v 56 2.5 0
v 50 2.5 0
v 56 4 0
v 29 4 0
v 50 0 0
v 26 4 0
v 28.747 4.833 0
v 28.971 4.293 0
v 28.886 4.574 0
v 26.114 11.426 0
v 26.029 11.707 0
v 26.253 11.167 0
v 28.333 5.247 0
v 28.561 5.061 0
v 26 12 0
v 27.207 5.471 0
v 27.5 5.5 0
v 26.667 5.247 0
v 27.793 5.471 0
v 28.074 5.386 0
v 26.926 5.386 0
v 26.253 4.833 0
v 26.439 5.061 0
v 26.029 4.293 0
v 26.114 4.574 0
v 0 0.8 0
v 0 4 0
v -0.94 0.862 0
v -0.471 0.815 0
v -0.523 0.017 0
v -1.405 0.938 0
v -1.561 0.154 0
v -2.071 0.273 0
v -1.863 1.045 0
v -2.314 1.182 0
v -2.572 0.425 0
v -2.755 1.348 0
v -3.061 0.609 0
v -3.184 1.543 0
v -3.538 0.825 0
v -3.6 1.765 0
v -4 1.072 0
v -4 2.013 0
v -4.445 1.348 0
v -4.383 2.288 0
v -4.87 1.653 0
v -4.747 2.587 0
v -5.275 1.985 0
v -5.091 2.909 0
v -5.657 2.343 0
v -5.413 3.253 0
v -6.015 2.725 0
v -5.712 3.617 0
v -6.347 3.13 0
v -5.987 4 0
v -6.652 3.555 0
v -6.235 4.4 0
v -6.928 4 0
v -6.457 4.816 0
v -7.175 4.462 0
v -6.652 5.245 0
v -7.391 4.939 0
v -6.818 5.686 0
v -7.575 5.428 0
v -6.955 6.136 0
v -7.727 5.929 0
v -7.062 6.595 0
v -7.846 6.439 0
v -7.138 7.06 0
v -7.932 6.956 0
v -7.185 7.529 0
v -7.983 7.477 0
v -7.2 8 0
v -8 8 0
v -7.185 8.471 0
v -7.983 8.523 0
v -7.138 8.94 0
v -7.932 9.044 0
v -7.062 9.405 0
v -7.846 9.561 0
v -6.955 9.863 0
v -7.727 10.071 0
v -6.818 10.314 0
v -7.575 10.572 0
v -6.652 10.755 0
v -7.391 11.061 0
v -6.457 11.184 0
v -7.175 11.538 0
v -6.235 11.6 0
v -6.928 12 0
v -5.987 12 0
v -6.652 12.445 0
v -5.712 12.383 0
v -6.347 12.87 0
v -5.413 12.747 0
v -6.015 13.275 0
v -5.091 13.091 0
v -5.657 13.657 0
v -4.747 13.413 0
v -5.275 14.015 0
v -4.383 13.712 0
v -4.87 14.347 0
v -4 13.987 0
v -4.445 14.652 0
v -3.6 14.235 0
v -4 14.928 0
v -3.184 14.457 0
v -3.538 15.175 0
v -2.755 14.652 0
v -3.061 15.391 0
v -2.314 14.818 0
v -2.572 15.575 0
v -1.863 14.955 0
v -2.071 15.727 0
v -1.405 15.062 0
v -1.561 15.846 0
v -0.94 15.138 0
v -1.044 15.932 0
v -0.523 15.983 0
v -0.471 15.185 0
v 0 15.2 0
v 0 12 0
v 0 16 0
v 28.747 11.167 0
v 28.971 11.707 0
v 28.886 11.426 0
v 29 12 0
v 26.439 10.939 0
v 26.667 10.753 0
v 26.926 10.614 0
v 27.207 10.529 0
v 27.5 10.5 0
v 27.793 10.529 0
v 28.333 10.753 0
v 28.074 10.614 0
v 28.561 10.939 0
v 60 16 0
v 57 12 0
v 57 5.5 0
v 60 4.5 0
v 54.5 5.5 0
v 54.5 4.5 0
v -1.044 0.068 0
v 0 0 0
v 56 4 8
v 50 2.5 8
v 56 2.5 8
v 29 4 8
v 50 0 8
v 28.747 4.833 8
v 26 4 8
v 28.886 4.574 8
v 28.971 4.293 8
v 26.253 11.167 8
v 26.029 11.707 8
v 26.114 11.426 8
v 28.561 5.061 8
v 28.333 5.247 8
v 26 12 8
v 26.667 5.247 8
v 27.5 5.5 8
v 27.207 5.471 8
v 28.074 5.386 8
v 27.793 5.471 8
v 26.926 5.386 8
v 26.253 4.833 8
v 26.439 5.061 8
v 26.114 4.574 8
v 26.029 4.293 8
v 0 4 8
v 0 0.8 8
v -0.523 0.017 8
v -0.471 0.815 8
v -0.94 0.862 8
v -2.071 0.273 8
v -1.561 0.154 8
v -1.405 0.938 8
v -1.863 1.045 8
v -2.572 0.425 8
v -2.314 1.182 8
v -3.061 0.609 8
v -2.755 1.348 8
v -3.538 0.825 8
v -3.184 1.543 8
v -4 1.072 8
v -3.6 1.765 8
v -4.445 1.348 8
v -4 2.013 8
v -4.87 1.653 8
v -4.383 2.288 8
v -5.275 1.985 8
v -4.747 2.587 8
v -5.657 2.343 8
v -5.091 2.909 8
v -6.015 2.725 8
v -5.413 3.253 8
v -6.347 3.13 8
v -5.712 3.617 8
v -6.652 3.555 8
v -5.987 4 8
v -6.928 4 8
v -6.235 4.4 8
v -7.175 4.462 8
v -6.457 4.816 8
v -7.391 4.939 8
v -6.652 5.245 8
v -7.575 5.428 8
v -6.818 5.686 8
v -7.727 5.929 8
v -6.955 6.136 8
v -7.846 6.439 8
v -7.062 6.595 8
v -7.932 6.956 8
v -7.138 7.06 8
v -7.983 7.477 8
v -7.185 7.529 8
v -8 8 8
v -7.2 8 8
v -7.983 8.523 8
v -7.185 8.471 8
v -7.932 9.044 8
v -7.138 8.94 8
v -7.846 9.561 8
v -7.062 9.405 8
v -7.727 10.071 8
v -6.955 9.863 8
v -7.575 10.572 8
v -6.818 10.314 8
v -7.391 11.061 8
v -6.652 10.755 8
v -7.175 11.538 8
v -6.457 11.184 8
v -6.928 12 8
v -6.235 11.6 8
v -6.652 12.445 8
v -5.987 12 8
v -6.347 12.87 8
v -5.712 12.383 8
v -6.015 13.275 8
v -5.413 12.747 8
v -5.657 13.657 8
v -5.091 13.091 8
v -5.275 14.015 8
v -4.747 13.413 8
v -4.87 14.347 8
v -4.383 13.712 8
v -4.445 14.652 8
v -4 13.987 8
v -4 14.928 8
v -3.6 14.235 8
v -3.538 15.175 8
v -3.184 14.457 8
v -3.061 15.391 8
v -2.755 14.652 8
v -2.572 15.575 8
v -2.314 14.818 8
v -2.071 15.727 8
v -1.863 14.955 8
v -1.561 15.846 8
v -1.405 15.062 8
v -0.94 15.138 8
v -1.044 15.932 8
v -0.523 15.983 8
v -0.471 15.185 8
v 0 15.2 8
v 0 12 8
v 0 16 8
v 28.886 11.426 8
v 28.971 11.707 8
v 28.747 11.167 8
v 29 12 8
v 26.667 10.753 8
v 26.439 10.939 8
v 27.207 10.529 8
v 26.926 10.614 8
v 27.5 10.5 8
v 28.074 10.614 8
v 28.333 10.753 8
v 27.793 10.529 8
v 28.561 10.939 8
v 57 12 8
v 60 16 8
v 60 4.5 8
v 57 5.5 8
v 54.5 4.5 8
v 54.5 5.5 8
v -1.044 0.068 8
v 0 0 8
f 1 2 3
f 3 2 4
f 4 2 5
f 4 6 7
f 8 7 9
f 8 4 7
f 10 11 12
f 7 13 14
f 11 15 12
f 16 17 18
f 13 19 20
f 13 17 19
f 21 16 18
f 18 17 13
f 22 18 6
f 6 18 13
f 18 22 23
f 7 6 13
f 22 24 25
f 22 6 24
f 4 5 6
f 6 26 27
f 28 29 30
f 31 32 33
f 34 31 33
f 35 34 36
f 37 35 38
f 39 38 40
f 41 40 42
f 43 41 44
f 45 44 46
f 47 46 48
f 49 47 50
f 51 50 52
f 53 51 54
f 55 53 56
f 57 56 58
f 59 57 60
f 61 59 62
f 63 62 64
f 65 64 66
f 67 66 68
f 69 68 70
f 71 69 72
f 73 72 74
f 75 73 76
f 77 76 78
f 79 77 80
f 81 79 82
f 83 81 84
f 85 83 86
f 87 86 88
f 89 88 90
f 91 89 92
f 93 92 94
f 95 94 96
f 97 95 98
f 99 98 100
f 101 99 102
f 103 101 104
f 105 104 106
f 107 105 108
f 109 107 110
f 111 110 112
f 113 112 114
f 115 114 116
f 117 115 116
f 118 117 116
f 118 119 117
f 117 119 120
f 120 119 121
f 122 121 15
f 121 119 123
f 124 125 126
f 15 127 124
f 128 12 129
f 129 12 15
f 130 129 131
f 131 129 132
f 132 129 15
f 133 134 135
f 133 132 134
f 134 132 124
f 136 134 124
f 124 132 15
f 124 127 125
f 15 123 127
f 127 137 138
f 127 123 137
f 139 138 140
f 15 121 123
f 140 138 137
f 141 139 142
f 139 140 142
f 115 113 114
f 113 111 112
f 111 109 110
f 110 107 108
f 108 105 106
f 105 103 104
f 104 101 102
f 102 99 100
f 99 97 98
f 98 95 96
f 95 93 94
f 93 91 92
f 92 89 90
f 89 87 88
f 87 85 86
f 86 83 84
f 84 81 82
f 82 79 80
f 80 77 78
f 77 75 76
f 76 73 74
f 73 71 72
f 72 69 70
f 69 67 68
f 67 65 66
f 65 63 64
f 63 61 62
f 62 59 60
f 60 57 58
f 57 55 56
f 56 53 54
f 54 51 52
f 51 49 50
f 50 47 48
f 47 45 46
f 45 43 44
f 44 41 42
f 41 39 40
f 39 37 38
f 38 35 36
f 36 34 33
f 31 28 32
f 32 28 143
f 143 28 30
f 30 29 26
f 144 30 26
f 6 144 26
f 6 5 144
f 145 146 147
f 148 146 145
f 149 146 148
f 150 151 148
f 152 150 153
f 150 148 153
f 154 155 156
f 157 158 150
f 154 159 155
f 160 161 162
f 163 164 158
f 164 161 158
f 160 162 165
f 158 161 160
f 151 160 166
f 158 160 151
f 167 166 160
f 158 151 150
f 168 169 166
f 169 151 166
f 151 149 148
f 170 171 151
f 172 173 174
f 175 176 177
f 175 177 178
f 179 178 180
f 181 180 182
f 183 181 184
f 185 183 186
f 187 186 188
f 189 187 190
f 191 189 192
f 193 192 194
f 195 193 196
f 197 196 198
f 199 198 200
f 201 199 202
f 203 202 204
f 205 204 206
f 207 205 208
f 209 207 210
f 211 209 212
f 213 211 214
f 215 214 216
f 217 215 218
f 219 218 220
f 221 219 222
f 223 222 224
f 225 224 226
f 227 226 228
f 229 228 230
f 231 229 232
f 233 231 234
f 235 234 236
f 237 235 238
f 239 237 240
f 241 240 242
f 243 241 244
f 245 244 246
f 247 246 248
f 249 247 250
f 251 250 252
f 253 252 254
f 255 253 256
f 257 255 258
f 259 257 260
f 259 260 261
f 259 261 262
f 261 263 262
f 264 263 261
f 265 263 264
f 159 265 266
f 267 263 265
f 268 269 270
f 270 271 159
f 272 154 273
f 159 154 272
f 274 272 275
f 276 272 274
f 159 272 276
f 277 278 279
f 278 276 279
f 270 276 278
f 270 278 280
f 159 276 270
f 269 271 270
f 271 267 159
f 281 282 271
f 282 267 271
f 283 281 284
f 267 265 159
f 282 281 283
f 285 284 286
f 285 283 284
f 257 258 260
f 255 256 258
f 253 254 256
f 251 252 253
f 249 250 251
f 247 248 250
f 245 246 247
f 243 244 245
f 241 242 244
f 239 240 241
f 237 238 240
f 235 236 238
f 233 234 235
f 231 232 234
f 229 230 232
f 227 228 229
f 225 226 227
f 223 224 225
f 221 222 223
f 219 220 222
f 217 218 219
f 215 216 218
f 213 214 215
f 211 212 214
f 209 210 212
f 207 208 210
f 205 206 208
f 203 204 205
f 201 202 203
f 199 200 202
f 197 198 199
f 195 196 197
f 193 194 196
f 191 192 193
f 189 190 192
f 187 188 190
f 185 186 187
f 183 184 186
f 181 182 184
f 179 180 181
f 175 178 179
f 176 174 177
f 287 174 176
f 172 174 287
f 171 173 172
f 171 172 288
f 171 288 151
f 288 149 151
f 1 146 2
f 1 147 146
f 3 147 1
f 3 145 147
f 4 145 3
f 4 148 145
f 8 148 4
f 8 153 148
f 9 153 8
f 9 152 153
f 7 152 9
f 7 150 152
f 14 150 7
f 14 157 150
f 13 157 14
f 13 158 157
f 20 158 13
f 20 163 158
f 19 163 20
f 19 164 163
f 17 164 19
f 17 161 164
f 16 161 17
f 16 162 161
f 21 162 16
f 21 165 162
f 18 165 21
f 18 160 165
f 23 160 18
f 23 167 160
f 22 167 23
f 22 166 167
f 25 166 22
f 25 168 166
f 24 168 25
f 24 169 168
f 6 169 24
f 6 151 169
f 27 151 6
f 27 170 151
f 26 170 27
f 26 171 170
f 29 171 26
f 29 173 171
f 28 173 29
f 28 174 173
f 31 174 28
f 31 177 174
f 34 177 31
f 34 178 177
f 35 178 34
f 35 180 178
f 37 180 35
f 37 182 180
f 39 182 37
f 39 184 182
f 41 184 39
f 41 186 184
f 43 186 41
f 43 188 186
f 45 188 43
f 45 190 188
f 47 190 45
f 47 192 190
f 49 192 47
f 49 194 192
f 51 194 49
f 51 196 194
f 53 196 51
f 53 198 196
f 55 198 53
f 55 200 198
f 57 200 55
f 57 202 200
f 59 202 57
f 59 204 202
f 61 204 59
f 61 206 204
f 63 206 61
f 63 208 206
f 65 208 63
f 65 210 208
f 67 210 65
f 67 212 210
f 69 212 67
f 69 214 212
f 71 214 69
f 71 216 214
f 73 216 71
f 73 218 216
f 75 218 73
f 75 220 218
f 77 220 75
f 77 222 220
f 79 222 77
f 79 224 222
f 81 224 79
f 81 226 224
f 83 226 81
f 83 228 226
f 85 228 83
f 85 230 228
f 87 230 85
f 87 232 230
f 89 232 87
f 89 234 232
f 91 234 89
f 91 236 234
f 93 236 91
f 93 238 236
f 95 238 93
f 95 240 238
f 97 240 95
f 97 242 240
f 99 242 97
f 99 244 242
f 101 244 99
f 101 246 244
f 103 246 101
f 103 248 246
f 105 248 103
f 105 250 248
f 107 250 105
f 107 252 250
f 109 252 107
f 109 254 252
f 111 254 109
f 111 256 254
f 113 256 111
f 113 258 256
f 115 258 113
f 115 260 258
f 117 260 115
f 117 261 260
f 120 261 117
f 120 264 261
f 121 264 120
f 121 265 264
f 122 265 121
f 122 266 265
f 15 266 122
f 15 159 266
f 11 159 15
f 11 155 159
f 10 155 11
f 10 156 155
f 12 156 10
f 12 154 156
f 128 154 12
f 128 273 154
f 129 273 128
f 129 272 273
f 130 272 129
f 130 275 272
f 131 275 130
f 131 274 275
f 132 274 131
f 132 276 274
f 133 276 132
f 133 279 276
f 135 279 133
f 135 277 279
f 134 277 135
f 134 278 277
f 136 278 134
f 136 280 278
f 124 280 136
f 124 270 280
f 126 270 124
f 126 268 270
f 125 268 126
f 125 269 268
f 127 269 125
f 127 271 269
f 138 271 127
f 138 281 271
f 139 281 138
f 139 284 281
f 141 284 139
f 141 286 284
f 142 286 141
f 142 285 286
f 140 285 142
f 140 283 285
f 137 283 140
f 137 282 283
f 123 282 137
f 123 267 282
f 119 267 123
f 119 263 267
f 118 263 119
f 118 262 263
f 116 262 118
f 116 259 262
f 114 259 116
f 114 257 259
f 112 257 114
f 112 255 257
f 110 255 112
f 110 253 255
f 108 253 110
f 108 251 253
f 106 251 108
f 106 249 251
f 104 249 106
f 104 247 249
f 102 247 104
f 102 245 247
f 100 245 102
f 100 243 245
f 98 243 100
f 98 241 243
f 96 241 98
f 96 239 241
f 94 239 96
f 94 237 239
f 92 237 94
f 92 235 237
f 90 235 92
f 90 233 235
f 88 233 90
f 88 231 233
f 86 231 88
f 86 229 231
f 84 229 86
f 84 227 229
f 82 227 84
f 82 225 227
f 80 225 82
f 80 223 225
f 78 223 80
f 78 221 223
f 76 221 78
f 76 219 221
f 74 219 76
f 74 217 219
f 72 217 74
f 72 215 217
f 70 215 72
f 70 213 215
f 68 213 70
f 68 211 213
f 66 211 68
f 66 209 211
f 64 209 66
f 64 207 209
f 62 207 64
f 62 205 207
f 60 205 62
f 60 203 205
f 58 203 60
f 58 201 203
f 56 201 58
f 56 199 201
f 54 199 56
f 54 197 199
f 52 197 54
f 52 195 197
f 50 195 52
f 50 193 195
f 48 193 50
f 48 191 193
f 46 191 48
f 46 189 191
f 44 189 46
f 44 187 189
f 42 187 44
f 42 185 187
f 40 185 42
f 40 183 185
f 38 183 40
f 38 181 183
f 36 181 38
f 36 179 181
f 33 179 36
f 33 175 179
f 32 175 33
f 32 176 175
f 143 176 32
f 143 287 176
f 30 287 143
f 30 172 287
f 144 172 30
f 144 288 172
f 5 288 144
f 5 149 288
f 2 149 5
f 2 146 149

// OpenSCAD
// KNOWN-RIGHT ALTERNATIVE (must pass): a correct part coded independently, the jaws as polygons, the hinge as a cut ring
// polygons and a rotate_extrude-free hinge
linear_extrude(8) {
 polygon([[0,0],[50,0],[50,2.5],[56,2.5],[56,4],[0,4]]);
 translate([0,12]) square([60,4]);
 difference(){ translate([0,8]) circle(r=8,$fn=96); translate([0,8]) circle(r=7.2,$fn=96); translate([0,-1]) square([20,20]); }
 for(y=[4,12]) translate([27.5,y]) circle(r=1.5,$fn=32);
 translate([57,4.5]) square([3,7.6]); translate([54.5,4.5]) square([2.6,1]); }
